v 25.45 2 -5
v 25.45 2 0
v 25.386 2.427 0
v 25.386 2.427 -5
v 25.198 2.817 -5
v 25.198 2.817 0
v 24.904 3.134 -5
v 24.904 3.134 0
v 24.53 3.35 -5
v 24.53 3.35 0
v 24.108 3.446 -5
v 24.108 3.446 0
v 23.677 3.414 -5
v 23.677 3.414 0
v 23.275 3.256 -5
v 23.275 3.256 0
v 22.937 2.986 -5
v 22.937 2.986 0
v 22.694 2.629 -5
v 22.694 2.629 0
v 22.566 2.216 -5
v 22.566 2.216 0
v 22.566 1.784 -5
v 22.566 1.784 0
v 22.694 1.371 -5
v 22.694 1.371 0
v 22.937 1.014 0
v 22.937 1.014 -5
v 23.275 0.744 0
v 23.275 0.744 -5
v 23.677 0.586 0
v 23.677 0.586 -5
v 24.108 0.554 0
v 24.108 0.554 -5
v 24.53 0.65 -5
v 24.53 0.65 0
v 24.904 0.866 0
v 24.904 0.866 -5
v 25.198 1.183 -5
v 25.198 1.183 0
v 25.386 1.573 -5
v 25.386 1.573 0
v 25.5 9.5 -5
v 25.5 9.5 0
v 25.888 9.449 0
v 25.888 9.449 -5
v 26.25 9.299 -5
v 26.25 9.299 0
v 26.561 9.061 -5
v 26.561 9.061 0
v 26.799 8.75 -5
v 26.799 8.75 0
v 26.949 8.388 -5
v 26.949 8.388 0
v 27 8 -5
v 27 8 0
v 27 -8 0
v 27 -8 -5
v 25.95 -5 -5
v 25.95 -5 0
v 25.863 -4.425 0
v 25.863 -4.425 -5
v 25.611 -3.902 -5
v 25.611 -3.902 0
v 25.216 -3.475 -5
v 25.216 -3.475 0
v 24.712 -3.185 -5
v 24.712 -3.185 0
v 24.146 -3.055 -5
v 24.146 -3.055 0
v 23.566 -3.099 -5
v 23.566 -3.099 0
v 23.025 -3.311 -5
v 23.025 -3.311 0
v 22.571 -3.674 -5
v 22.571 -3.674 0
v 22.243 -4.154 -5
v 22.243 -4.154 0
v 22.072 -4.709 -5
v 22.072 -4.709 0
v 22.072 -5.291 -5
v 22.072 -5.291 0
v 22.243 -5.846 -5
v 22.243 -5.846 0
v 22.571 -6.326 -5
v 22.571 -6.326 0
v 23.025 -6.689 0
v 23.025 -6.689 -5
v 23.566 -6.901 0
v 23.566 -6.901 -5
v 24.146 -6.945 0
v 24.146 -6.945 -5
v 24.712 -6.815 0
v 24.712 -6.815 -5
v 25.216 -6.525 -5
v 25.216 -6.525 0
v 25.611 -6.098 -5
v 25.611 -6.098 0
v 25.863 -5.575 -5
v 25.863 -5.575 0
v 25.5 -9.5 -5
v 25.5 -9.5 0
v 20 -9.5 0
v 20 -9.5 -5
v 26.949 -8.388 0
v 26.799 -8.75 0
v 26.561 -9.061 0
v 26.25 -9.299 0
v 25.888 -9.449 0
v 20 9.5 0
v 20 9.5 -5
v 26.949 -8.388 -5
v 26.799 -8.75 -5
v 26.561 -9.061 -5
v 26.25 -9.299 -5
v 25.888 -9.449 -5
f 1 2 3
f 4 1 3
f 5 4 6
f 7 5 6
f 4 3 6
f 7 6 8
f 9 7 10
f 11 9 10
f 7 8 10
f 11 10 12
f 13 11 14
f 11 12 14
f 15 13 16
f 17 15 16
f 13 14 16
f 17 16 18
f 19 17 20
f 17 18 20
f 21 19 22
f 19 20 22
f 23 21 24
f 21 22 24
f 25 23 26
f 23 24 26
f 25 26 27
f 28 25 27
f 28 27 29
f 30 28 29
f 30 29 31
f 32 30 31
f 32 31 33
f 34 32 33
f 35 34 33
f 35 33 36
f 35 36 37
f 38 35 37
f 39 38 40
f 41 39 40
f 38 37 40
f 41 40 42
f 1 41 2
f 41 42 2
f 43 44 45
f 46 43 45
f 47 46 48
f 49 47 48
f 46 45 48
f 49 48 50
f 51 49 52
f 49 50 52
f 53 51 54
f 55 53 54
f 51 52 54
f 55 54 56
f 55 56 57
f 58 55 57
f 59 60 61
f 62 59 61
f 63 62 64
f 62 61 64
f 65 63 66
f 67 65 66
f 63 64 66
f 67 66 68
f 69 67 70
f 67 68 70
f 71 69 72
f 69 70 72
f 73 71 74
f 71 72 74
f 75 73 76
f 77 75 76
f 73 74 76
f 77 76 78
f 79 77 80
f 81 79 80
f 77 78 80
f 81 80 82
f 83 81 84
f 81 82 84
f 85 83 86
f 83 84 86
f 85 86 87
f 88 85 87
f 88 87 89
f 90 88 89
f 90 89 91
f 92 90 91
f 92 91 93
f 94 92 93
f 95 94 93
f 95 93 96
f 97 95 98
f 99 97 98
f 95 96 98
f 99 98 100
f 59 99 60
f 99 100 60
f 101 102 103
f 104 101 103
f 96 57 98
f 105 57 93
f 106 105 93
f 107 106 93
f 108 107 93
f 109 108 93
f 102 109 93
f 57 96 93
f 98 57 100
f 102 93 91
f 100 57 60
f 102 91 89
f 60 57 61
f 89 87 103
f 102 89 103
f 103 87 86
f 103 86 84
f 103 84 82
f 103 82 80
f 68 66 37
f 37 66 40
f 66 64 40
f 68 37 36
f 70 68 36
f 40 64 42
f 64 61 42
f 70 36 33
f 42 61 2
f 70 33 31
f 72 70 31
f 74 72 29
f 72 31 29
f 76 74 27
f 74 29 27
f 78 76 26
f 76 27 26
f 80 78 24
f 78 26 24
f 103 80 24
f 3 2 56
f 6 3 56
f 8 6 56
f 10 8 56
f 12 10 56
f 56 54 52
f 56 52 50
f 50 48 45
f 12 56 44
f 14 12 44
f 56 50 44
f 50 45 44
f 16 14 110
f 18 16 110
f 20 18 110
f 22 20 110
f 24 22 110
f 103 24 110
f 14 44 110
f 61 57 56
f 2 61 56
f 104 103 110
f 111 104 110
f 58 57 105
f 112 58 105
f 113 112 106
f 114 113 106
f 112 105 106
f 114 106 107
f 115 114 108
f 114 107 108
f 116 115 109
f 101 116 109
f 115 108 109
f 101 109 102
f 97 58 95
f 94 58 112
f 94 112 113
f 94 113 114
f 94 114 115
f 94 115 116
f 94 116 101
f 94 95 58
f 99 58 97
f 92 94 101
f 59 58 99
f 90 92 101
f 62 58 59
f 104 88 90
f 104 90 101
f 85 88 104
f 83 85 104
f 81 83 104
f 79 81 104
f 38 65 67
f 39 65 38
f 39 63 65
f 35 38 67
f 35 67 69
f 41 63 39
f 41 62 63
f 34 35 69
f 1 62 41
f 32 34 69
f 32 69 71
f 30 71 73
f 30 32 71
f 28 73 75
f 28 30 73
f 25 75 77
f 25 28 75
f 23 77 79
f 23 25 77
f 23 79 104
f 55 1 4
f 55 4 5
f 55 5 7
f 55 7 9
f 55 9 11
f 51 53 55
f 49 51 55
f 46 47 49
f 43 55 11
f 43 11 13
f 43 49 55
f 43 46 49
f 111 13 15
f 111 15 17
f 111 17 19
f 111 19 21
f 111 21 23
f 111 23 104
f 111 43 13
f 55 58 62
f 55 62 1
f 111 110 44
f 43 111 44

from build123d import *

# Parameters (mm, degrees)
SKETCH1_R           = 1.95
SKETCH1_R_2         = 1.45
BOSS_EXTRUDE2_DEPTH = 5


with BuildPart() as part:
    # Sketch1 → Boss-Extrude2 (new body)
    with BuildSketch(Plane.XY):
        with BuildLine():
            Line((20, -9.5), (20, 9.5))
            Line((20, 9.5), (25.5, 9.5))
            ThreePointArc((25.5, 9.5), (26.560660172, 9.060660172), (27, 8))
            Line((27, 8), (27, -8))
            ThreePointArc((27, -8), (26.560660172, -9.060660172), (25.5, -9.5))
            Line((25.5, -9.5), (20, -9.5))
        make_face()
        with Locations((24, -5)):
            Circle(SKETCH1_R, mode=Mode.SUBTRACT)
        with Locations((24, 2)):
            Circle(SKETCH1_R_2, mode=Mode.SUBTRACT)
    extrude(amount=-BOSS_EXTRUDE2_DEPTH)


solid = part.part
